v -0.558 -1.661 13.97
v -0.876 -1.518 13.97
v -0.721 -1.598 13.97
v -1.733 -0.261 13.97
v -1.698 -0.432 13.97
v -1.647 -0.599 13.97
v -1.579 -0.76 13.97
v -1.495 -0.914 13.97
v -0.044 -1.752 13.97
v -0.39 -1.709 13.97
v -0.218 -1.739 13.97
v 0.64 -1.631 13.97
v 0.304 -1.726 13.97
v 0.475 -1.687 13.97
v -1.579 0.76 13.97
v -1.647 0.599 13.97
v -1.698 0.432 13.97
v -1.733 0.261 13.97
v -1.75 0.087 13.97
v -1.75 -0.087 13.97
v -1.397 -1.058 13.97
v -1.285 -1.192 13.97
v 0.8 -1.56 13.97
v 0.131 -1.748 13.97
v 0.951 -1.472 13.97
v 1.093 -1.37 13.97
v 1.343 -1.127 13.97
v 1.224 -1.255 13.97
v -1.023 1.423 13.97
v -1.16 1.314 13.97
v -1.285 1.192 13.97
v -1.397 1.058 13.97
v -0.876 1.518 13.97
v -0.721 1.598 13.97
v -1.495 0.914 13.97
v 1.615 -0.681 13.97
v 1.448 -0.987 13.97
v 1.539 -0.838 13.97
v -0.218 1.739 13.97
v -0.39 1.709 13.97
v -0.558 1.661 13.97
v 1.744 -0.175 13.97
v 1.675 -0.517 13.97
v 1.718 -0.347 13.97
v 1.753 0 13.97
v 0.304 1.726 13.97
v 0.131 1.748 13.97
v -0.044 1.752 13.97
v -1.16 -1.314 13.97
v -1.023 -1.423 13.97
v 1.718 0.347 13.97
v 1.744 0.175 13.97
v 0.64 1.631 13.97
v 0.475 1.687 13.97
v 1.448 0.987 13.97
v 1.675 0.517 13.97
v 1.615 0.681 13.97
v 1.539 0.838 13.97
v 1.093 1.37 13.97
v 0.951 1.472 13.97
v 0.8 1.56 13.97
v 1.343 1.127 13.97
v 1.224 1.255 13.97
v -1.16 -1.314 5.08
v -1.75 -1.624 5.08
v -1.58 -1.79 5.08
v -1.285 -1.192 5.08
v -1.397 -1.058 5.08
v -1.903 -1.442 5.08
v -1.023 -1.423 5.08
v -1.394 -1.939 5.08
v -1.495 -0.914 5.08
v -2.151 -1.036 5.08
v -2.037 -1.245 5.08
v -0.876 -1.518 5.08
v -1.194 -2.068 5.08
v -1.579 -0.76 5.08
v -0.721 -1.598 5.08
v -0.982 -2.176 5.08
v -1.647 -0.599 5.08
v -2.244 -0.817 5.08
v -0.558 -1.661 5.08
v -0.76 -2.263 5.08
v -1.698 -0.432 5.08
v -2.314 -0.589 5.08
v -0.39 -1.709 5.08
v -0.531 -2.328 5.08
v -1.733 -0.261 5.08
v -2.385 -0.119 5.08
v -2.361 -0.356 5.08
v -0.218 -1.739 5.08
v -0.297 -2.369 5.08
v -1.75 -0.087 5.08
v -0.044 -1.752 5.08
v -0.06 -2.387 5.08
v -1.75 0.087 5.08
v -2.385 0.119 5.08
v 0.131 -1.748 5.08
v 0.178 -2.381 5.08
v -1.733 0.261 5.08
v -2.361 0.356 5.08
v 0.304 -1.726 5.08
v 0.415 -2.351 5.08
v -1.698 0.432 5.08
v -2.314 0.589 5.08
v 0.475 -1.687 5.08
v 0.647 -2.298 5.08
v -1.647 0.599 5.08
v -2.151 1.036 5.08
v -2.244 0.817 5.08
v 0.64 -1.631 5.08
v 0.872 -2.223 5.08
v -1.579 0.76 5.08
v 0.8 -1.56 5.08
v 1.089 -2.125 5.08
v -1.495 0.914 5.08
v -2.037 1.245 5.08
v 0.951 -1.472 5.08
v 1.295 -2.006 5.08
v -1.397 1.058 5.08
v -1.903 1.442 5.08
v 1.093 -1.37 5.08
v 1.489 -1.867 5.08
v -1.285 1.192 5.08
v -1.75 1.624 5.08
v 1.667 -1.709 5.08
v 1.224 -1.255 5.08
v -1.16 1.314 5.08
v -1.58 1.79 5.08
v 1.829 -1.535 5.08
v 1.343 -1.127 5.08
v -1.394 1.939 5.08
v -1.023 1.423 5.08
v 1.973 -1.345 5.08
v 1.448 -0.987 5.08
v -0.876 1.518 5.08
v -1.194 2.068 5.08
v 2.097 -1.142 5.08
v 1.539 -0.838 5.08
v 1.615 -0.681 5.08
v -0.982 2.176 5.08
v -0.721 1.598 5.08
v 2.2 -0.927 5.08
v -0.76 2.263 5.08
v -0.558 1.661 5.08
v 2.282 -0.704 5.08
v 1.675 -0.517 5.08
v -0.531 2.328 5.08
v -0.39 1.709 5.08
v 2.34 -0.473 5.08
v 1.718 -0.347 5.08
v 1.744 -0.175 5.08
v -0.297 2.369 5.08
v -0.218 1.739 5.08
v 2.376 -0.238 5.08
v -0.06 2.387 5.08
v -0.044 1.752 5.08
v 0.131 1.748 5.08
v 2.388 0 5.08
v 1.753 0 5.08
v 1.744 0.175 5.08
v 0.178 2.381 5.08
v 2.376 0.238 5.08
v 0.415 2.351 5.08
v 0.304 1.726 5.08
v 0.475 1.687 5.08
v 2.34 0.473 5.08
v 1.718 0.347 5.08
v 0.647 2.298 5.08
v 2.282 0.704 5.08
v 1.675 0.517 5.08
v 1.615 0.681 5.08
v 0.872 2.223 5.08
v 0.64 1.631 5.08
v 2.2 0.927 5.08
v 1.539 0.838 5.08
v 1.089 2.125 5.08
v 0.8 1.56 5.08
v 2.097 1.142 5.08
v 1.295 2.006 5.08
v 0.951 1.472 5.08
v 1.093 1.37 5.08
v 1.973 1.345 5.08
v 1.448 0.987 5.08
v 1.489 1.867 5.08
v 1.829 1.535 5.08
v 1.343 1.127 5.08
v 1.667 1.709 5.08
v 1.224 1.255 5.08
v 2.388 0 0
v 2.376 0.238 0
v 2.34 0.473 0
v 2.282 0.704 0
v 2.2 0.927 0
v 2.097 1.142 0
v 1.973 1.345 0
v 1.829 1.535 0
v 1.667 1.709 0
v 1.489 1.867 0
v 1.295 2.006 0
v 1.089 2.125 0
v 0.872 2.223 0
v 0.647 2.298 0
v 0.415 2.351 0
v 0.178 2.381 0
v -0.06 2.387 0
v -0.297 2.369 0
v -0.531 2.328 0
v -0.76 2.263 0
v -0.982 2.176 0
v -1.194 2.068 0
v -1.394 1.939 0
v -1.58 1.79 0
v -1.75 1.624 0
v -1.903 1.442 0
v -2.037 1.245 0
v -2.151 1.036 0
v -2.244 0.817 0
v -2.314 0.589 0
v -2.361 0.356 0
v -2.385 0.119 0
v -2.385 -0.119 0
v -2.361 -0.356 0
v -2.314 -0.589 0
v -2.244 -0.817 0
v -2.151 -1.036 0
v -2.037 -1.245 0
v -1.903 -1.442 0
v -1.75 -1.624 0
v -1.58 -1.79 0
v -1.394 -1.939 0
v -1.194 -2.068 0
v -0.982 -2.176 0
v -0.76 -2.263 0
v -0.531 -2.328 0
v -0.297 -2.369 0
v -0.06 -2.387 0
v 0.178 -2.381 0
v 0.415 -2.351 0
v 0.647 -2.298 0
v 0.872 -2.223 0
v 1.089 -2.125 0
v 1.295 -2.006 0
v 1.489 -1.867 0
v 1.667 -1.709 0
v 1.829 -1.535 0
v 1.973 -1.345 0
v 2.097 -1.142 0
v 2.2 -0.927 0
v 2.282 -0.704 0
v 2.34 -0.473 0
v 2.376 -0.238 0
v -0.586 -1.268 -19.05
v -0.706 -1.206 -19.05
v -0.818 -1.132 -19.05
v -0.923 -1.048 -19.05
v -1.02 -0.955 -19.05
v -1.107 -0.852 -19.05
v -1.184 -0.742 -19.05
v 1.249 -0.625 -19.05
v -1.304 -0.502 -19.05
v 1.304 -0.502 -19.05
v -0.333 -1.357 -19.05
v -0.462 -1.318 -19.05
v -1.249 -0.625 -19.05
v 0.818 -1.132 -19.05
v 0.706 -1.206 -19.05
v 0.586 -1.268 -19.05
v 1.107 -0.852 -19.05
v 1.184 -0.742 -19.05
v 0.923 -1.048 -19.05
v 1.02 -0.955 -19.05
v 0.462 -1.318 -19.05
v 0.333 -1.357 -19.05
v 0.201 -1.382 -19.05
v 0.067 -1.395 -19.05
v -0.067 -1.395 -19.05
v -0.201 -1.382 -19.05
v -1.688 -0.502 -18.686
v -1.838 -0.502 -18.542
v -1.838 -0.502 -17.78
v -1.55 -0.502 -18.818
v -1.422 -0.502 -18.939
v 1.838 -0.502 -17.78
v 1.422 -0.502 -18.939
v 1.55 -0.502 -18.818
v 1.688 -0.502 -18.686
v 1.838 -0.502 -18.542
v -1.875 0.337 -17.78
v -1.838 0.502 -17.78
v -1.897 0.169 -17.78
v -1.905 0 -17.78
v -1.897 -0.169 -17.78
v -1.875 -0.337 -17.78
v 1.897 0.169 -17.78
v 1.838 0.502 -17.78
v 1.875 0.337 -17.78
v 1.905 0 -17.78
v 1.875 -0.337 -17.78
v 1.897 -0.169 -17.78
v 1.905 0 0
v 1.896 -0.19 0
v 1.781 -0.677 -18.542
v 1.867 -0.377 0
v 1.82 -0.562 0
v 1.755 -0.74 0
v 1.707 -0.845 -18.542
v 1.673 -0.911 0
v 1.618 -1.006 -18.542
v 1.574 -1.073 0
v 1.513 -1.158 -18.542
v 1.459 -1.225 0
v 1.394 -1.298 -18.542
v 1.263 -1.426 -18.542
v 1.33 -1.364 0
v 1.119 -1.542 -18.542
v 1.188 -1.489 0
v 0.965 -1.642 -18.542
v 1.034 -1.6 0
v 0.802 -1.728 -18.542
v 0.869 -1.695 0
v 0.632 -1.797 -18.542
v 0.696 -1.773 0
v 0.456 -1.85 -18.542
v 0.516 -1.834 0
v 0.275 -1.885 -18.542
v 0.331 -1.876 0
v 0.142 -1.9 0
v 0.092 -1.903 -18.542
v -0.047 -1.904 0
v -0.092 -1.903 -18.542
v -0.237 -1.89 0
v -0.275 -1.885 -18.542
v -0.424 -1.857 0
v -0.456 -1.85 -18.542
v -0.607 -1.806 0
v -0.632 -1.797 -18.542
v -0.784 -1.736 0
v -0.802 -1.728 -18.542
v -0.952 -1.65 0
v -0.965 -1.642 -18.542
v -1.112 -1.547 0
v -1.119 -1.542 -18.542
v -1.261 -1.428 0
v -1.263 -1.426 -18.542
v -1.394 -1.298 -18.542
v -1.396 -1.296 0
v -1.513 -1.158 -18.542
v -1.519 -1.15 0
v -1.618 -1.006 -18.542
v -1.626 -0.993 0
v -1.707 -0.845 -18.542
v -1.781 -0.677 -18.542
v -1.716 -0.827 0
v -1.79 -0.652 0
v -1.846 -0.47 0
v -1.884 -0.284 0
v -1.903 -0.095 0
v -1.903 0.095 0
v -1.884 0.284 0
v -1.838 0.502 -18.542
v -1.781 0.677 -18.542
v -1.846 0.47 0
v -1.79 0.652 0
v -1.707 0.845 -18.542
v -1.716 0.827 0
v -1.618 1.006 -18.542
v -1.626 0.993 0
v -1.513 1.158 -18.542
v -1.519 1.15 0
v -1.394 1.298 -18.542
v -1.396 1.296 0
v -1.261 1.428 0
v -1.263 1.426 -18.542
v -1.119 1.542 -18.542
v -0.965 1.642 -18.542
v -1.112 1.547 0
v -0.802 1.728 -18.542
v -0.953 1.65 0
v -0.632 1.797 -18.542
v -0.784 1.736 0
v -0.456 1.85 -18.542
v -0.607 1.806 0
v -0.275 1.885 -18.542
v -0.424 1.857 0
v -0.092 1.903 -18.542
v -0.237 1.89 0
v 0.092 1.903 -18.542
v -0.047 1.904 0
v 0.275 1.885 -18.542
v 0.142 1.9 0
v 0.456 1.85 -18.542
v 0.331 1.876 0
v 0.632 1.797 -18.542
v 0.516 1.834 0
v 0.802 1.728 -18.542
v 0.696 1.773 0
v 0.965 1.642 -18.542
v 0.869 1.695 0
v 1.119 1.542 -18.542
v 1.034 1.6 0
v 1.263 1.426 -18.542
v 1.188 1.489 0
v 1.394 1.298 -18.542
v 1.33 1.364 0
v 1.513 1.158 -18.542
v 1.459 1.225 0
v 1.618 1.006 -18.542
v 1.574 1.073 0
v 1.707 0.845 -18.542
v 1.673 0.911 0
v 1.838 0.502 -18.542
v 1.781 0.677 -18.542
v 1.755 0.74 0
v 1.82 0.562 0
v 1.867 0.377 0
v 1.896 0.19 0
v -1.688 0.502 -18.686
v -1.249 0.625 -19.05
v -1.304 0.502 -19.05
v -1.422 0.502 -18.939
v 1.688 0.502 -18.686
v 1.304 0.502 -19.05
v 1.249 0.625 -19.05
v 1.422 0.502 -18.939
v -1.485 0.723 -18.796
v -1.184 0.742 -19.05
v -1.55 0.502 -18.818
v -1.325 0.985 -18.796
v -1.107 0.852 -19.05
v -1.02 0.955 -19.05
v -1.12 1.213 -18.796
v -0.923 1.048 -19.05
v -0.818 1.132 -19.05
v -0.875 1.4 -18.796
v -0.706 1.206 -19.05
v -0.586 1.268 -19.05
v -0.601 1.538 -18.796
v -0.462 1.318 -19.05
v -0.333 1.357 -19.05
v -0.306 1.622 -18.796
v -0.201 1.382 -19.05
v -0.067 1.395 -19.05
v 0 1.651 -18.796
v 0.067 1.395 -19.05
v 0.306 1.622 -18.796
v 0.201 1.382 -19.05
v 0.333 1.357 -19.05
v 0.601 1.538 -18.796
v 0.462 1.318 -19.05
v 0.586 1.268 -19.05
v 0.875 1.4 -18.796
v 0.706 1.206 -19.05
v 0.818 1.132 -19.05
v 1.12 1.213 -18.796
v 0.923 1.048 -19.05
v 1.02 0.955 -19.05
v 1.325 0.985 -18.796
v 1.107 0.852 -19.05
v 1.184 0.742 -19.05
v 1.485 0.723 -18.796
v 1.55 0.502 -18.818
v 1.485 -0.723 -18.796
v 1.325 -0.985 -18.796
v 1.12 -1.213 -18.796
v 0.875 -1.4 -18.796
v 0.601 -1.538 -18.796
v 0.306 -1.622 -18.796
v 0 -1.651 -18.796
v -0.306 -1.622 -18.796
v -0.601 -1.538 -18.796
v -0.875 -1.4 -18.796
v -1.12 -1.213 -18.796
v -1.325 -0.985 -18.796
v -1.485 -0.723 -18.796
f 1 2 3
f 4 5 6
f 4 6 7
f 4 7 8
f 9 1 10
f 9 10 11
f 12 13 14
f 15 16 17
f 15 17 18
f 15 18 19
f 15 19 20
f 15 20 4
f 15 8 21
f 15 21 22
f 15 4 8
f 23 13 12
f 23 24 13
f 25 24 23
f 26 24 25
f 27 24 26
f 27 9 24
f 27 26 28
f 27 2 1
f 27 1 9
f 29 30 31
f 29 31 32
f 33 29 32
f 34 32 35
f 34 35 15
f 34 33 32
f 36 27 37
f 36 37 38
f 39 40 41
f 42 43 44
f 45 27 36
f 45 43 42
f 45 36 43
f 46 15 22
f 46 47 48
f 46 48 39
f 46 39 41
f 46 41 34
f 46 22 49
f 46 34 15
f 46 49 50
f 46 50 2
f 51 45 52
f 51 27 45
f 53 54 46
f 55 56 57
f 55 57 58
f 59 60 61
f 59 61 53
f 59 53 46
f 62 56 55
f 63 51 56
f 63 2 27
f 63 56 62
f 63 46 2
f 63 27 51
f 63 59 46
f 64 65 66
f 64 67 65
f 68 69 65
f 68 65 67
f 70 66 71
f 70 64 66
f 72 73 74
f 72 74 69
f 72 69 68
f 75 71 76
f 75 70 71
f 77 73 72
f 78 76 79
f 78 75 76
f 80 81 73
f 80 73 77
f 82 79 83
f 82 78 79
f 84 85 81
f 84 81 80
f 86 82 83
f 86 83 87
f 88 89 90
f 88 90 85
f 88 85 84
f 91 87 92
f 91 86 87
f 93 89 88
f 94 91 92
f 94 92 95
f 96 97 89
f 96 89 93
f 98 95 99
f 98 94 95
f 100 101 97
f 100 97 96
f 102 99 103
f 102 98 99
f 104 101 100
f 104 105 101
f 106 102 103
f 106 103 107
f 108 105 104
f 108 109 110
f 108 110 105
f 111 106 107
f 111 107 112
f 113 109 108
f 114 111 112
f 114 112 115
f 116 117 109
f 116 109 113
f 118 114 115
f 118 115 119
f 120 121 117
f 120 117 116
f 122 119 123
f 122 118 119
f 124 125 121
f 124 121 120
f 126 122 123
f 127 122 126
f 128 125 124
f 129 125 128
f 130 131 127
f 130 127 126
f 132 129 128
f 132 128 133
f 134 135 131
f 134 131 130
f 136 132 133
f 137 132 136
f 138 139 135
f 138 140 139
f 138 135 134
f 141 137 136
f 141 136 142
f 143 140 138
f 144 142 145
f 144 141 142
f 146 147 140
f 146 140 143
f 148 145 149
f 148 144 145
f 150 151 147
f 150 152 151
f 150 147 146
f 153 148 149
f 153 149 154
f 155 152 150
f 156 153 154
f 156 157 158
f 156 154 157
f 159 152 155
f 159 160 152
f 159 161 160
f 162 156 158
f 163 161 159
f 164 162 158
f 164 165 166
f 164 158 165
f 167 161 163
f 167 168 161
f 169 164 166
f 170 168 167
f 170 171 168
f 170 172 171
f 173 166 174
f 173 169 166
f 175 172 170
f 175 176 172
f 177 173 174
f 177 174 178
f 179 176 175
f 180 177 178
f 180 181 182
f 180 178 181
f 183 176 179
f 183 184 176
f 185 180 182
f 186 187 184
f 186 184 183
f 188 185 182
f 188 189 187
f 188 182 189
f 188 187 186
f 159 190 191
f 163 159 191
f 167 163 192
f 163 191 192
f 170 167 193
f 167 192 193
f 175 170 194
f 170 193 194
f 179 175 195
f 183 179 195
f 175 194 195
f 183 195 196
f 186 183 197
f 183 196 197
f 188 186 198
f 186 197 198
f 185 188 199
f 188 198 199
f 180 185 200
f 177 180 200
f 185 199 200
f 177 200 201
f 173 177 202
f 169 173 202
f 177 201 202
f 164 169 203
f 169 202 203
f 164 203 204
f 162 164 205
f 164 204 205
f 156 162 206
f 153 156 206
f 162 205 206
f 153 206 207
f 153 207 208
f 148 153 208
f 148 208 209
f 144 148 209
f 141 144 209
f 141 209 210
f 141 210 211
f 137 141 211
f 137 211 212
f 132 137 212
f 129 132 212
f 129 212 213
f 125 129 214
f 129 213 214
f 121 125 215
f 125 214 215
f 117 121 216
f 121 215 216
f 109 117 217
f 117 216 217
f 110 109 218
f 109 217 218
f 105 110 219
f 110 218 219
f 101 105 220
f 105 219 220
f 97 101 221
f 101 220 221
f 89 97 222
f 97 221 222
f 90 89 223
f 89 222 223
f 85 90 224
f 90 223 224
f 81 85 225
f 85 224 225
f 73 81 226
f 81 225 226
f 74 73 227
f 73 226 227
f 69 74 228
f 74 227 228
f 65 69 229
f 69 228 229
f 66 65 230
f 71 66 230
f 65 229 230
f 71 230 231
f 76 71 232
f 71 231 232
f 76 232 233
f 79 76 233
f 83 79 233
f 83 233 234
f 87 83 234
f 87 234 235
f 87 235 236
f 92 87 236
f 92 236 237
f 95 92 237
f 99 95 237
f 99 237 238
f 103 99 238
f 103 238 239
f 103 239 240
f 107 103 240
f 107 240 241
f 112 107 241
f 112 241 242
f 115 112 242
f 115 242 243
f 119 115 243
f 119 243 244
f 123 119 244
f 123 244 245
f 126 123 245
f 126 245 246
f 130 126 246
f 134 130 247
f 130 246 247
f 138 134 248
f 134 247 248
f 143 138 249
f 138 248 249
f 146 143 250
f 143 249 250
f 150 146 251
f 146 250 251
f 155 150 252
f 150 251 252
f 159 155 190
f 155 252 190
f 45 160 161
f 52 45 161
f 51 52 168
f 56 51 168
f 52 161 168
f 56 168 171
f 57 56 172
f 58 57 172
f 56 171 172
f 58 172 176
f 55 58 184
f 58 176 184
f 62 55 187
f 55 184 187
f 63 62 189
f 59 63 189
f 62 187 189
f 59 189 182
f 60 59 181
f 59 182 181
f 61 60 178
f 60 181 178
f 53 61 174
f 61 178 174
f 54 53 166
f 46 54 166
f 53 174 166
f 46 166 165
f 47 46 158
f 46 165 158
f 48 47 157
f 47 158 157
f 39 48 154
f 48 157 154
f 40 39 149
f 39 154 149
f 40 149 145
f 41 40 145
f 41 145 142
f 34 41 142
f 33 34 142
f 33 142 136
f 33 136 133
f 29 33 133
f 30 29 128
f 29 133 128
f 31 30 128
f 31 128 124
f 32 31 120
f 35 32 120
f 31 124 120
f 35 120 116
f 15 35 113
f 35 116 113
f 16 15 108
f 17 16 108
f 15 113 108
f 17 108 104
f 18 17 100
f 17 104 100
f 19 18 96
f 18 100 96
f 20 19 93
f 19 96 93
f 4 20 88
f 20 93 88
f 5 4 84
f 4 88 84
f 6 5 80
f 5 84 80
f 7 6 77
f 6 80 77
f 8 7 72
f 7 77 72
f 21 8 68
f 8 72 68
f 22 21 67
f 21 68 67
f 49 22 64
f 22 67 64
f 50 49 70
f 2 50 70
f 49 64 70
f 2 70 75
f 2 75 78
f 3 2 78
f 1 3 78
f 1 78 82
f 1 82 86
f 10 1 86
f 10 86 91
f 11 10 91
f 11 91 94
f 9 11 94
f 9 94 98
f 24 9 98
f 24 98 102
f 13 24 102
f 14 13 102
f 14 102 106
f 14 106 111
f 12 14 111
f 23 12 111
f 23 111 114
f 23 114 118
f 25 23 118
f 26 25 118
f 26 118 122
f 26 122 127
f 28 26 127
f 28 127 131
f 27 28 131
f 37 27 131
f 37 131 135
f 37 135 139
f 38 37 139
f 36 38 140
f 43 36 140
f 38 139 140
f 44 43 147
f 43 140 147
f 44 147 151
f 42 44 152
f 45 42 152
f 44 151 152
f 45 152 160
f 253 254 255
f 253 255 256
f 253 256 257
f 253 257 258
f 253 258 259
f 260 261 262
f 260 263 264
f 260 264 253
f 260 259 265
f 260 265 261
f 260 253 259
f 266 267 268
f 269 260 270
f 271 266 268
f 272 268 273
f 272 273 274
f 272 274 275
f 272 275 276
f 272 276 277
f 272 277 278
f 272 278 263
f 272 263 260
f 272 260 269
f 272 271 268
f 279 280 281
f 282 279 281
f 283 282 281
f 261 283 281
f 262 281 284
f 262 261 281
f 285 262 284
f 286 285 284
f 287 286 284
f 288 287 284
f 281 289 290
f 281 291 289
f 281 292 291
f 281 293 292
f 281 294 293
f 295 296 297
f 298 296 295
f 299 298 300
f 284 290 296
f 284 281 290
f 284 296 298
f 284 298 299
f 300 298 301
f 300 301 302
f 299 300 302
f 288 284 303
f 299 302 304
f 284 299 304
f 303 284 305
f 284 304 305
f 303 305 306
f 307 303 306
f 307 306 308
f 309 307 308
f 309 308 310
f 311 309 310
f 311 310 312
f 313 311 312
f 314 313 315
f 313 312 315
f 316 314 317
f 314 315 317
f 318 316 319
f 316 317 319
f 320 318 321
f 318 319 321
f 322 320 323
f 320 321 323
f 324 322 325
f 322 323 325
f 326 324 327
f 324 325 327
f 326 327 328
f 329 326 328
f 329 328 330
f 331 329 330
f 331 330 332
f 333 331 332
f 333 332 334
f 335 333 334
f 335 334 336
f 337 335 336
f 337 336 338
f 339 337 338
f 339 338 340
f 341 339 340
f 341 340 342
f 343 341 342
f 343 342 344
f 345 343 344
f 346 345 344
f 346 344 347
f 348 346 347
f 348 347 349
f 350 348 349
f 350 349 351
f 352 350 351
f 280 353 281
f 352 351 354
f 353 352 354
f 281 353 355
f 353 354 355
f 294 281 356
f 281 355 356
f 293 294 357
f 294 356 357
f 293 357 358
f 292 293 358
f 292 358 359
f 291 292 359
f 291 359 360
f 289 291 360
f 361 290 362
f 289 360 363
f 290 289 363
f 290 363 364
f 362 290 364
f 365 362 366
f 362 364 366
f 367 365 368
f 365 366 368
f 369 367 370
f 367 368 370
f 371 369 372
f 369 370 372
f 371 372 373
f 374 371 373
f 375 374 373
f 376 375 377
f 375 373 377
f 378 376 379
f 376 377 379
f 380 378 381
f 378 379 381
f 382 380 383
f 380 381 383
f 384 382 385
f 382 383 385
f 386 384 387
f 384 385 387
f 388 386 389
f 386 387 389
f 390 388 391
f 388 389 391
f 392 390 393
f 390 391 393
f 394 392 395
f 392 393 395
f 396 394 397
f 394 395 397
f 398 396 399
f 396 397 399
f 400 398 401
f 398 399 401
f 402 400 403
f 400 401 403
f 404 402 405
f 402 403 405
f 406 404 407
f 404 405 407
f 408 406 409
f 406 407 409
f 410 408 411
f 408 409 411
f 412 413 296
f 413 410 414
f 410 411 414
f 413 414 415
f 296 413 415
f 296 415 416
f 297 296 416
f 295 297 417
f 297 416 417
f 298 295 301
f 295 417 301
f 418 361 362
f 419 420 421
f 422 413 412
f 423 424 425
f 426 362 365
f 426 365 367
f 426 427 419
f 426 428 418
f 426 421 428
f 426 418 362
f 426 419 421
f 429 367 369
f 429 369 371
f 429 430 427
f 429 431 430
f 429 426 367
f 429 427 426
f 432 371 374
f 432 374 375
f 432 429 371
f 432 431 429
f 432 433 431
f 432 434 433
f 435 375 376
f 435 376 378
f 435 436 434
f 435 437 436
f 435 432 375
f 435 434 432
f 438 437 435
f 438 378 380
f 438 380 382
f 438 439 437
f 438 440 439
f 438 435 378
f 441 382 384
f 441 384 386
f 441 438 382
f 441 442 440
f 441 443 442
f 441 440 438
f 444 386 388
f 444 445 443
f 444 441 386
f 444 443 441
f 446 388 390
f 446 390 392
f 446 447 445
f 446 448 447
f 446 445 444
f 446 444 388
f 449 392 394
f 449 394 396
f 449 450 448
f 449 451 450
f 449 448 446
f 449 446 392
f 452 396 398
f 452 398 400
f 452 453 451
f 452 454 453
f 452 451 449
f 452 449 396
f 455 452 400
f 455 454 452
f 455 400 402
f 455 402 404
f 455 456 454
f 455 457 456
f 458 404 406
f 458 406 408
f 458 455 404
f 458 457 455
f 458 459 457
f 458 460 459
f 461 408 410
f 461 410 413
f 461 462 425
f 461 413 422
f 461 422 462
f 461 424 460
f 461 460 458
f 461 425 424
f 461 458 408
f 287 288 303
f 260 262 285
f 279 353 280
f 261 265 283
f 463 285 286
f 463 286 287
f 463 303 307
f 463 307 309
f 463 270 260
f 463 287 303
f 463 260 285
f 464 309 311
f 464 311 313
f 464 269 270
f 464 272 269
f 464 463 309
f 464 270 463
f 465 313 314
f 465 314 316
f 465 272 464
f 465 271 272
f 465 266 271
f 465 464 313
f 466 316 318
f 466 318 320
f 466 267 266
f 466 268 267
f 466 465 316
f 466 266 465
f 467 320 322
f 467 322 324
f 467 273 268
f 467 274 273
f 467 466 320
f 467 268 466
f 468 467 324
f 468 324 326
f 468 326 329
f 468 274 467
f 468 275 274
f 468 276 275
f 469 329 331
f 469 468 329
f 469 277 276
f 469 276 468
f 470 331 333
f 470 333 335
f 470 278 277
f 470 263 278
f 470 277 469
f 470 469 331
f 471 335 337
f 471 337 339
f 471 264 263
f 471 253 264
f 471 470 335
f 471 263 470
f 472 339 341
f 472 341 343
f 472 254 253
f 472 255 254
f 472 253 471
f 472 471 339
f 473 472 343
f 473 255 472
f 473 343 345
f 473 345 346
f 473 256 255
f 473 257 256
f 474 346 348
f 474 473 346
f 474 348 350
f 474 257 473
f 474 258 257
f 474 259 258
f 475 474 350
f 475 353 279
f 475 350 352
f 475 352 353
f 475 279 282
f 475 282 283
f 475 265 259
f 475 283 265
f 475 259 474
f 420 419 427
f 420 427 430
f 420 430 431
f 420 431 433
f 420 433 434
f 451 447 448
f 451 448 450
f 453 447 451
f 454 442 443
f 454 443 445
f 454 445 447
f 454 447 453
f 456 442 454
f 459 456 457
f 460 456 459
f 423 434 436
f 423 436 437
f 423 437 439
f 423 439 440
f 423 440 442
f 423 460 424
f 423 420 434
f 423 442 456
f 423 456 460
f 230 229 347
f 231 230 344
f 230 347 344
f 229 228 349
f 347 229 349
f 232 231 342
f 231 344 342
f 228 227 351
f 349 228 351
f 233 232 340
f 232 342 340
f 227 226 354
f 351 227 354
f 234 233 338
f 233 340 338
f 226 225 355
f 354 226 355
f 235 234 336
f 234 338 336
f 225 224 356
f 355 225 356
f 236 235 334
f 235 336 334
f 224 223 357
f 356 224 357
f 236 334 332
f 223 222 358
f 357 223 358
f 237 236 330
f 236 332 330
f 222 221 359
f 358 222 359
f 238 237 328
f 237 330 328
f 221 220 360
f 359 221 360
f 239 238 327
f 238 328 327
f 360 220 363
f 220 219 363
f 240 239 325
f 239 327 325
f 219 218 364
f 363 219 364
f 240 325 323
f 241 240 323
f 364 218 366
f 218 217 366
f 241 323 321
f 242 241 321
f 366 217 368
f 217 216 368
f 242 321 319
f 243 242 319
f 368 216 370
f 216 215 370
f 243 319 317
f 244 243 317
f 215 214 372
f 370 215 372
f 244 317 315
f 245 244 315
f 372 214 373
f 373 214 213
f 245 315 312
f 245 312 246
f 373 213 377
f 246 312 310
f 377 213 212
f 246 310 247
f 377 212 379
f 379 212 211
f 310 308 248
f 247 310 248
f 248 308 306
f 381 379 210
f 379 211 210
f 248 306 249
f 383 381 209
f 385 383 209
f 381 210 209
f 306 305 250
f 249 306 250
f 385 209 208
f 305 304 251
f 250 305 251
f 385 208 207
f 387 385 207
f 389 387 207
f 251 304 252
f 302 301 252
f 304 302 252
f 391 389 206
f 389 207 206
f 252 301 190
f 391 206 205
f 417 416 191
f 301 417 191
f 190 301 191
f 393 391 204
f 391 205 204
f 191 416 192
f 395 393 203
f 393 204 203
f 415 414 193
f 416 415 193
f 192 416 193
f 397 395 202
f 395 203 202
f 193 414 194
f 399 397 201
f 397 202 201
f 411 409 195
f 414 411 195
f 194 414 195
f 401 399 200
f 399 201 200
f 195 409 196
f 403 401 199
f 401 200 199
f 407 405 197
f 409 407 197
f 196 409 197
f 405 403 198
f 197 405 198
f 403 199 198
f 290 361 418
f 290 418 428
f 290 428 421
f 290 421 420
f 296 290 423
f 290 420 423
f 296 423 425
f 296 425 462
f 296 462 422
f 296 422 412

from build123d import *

# Parameters (mm, degrees)
F0_R     = 2.3876
F1_DEPTH = 5.08
F2_R     = 1.7526
F3_DEPTH = 8.89
F4_R     = 1.905
F5_DEPTH = 19.05
F6_SIZE  = 0.508
F7_W     = 8.721276
F7_H     = 1.003916
F8_DEPTH = 1.27


with BuildPart() as f1:
    # F0 (on Top) → F1 (new body)
    with BuildSketch(Plane.XY):
        Circle(F0_R)
    extrude(amount=F1_DEPTH)

    # F2 (on face) → F3 (join)
    with BuildSketch(Plane.XY.offset(5.08)):
        Circle(F2_R)
    extrude(amount=F3_DEPTH)

    # F4 (on face) → F5 (join)
    with BuildSketch(Plane(origin=(0, 0, 0), x_dir=(1, 0, 0), z_dir=(0, 0, -1))):
        Circle(F4_R)
    extrude(amount=F5_DEPTH)

    # F6
    f6_edges = [f1.edges().sort_by_distance(p)[0] for p in [
        (-1.905, 0, -19.05),
    ]]
    chamfer(f6_edges, length=F6_SIZE)

    # F7 (on face) → F8 (cut)
    with BuildSketch(Plane(origin=(0, 0, -19.05), x_dir=(1, 0, 0), z_dir=(0, 0, -1))):
        Rectangle(F7_W, F7_H)
    extrude(amount=-F8_DEPTH, mode=Mode.SUBTRACT)


solid = f1.part
